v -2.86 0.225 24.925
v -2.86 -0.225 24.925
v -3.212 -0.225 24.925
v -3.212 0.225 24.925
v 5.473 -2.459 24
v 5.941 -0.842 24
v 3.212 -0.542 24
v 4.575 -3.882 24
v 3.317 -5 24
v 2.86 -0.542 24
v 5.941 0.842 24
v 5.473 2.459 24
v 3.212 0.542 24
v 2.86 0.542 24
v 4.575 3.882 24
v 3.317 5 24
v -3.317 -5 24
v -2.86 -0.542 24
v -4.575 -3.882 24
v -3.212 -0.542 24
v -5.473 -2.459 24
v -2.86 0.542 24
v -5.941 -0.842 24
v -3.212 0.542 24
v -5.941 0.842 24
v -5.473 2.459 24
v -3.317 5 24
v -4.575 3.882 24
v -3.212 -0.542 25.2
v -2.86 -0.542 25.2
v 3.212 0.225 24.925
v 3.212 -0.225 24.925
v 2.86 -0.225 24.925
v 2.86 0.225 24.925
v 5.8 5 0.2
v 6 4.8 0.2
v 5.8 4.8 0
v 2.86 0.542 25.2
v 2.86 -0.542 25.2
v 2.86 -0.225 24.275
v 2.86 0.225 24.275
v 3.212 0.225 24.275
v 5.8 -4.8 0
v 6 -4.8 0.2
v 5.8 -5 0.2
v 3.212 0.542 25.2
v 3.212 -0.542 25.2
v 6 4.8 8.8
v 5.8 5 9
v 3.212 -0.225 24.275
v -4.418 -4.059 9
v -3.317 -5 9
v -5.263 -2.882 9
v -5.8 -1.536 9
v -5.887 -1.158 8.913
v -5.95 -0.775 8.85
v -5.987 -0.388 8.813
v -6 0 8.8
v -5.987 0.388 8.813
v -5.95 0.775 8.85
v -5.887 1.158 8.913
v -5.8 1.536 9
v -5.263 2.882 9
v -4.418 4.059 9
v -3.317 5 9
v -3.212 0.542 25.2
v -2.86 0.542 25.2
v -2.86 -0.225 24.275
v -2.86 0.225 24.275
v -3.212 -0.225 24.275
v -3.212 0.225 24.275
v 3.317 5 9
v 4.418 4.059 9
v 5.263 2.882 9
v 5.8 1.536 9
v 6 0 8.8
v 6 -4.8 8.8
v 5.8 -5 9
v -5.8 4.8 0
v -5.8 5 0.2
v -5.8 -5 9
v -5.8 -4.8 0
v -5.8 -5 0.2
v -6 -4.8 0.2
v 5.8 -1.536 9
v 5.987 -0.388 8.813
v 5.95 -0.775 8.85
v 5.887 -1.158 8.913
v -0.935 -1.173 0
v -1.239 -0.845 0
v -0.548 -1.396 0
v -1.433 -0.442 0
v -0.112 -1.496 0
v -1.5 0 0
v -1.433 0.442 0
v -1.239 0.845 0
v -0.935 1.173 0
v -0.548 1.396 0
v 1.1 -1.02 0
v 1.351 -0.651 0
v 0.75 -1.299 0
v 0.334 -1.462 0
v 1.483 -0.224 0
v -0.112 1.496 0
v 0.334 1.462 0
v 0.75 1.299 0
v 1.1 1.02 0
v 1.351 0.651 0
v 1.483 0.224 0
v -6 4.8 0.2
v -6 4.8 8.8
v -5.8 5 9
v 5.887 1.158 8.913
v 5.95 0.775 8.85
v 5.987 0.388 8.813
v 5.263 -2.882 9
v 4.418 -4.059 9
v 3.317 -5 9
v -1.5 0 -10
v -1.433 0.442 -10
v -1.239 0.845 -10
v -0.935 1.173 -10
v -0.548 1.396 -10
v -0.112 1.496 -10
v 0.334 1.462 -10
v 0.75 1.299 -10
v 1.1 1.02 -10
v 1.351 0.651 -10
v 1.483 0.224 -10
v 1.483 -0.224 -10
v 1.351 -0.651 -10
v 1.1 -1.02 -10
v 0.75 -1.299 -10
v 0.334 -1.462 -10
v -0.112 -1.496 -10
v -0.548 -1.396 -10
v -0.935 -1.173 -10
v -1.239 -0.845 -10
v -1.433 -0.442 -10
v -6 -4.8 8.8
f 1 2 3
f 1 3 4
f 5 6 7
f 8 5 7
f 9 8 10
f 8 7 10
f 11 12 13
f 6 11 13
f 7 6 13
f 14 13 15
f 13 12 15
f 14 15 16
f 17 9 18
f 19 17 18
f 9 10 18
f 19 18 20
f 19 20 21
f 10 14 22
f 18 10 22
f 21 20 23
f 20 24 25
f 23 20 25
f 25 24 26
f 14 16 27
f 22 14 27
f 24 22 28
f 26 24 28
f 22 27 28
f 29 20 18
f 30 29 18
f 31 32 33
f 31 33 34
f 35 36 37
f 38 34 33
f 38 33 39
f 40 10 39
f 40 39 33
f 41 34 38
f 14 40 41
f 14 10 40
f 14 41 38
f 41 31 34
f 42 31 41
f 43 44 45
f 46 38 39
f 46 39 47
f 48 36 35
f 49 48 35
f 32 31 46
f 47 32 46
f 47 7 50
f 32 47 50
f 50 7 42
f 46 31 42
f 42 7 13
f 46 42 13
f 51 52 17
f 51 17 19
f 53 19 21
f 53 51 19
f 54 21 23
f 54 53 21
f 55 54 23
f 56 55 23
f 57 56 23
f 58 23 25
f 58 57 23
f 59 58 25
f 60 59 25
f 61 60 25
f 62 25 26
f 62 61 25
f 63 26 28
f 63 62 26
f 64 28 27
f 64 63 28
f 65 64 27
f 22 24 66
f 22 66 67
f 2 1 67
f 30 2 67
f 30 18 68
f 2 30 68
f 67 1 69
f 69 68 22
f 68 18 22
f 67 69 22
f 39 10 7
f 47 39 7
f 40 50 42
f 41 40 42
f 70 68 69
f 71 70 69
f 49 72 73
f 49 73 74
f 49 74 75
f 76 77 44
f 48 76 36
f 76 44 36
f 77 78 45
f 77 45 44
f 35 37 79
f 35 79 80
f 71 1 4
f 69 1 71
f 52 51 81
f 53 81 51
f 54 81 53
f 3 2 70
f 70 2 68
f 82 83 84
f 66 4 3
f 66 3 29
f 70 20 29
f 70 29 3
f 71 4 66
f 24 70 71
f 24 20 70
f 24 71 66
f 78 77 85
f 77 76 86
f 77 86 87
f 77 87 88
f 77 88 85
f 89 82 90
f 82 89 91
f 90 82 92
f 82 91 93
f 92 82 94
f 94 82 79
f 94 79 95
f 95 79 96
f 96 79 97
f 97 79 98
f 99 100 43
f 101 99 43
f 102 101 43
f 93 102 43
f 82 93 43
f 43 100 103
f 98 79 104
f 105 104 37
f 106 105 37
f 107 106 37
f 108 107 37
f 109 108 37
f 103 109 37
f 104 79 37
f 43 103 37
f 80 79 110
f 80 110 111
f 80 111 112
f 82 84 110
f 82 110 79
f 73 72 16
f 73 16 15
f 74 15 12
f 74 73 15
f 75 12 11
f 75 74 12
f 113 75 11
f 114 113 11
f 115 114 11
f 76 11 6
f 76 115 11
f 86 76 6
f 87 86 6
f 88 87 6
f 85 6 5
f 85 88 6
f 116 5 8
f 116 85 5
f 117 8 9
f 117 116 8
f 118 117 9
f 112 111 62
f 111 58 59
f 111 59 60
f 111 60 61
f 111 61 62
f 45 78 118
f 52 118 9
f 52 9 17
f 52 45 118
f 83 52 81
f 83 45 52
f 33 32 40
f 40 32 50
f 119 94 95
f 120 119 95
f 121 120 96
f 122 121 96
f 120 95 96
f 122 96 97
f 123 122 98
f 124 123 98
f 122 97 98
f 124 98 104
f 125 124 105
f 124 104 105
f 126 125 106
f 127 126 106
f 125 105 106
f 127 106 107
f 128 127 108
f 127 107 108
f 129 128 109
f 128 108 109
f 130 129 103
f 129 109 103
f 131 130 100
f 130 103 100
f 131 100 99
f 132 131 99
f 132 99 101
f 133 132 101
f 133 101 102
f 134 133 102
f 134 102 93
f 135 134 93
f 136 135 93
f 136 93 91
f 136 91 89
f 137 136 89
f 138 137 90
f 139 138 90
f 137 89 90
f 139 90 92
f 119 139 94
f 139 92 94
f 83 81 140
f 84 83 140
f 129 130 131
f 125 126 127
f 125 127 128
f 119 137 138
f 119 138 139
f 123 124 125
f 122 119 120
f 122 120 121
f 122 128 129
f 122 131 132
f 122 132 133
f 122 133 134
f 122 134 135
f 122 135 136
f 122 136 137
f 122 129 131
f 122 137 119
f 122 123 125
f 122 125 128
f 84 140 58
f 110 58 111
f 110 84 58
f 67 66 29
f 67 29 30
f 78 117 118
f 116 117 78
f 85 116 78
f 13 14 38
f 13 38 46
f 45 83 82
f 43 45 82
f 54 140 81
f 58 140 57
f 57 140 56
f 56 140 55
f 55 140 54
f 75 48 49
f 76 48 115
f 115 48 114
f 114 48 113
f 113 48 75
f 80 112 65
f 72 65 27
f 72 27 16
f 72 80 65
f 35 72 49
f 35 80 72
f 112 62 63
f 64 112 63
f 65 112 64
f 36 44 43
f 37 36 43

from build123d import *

# Parameters (mm, degrees)
SKETCH_1_W          = 12
SKETCH_1_H          = 10
EXTRUDE_2_DEPTH     = 9
EXTRUDE_4_DEPTH     = 15
CHAMFER_4_SIZE      = 0.2
SKETCH_4_W          = 0.352238381
SKETCH_4_H          = 1.084523436
EXTRUDE_5_DEPTH     = 1.2
SKETCH_5_W          = 0.65
SKETCH_5_H          = 0.45
CUT_EXTRUDE_1_DEPTH = 28.29282553
SKETCH_6_R          = 1.5
EXTRUDE_6_DEPTH     = 10


with BuildPart() as part:
    # 草图1 → 凸台-拉伸2 (new body)
    with BuildSketch(Plane.XY):
        Rectangle(SKETCH_1_W, SKETCH_1_H)
    extrude(amount=EXTRUDE_2_DEPTH)

    # 草图2 → 凸台-拉伸4 (add)
    with BuildSketch(Plane.XY.offset(9)):
        with BuildLine():
            Line((-3.31662479, 5), (3.31662479, 5))
            ThreePointArc((3.31662479, 5), (6, 0), (3.31662479, -5))
            Line((3.31662479, -5), (-3.31662479, -5))
            ThreePointArc((-3.31662479, -5), (-6, 0), (-3.31662479, 5))
        make_face()
    extrude(amount=EXTRUDE_4_DEPTH)

    # 倒角4
    # the kernel refuses this chamfer: 0.2 mm, written as the material it takes off along each edge
    with BuildSketch(Plane(origin=(-5.866666667, -4.866666667, 0.133333333), x_dir=(-0.7071067811865491, 0.707106781186546, 0), z_dir=(-0.577350269189624, -0.5773502691896265, -0.5773502691896268)), Plane(origin=(5.866666667, 4.866666667, 0.133333333), x_dir=(-0.7071067811865478, -3.1401849173675483e-15, -0.7071067811865472), z_dir=(0.577350269189624, 0.5773502691896265, -0.577350269189627))) as chamfer_4_piece_1:
        Polygon((-0.141421356, -0.081649658), (0.141421356, -0.081649658), (0, 0.163299316), align=None)
    extrude(amount=0.254034118, mode=Mode.SUBTRACT)
    with BuildSketch(Plane(origin=(5.866666667, -4.866666667, 0.133333333), x_dir=(0.707106781186546, 0.7071067811865491, 0), z_dir=(0.5773502691896265, -0.577350269189624, -0.577350269189627)), Plane(origin=(-5.866666667, 4.866666667, 0.133333333), x_dir=(0.7071067811865478, 0, -0.7071067811865472), z_dir=(-0.5773502691896265, 0.577350269189624, -0.5773502691896268))) as chamfer_4_piece_2:
        Polygon((-0.141421356, 0.081649658), (0.141421356, 0.081649658), (0, -0.163299316), align=None)
    extrude(amount=0.254034118, mode=Mode.SUBTRACT)
    with BuildSketch(Plane(origin=(-6, 5.514336598, 9), x_dir=(-0.02749587661058742, 0, -0.9996219169112966), z_dir=(0, -1, 0))) as chamfer_4_piece_3_section:
        Polygon((CHAMFER_4_SIZE * 0.999621916911, CHAMFER_4_SIZE * 0.0274958766106), (-CHAMFER_4_SIZE * 0.0274958766106, CHAMFER_4_SIZE * 0.999621916911), (0, 0), align=None)
    chamfer_4_piece_3 = extrude(amount=5.514336598, mode=Mode.PRIVATE)
    chamfer_4_piece_3 = chamfer_4_piece_3 - Plane(origin=(0, 0, 8.93146509), x_dir=(-0.5527707983925667, -0.8333333333333334, 0), z_dir=(0, 0, -1)) * Cylinder(6, 12, mode=Mode.PRIVATE)
    add(chamfer_4_piece_3, mode=Mode.SUBTRACT)
    with BuildSketch(Plane(origin=(6, 0, 9), x_dir=(0.02749587661058742, 0, -0.9996219169112966), z_dir=(0, 1, 0))) as chamfer_4_piece_4_section:
        Polygon((CHAMFER_4_SIZE * 0.999621916911, CHAMFER_4_SIZE * 0.0274958766106), (-CHAMFER_4_SIZE * 0.0274958766106, CHAMFER_4_SIZE * 0.999621916911), (0, 0), align=None)
    chamfer_4_piece_4 = extrude(amount=5.514336598, mode=Mode.PRIVATE)
    chamfer_4_piece_4 = chamfer_4_piece_4 - Plane(origin=(0, 0, 8.931465093), x_dir=(0.5527707983925666, 0.8333333333333334, 0), z_dir=(0, 0, -1)) * Cylinder(6, 12, mode=Mode.PRIVATE)
    add(chamfer_4_piece_4, mode=Mode.SUBTRACT)
    with BuildSketch(Plane(origin=(-6, 0, 9), x_dir=(-0.02749587661058742, 0, -0.9996219169112966), z_dir=(0, -1, 0))) as chamfer_4_piece_5_section:
        Polygon((CHAMFER_4_SIZE * 0.999621916911, CHAMFER_4_SIZE * 0.0274958766106), (-CHAMFER_4_SIZE * 0.0274958766106, CHAMFER_4_SIZE * 0.999621916911), (0, 0), align=None)
    chamfer_4_piece_5 = extrude(amount=5.514336598, mode=Mode.PRIVATE)
    chamfer_4_piece_5 = chamfer_4_piece_5 - Plane(origin=(0, 0, 8.931465093), x_dir=(-0.5527707983925667, -0.8333333333333334, 0), z_dir=(0, 0, -1)) * Cylinder(6, 12, mode=Mode.PRIVATE)
    add(chamfer_4_piece_5, mode=Mode.SUBTRACT)
    with BuildSketch(Plane(origin=(6, -5.514336598, 9), x_dir=(0.02749587661058742, 0, -0.9996219169112966), z_dir=(0, 1, 0))) as chamfer_4_piece_6_section:
        Polygon((CHAMFER_4_SIZE * 0.999621916911, CHAMFER_4_SIZE * 0.0274958766106), (-CHAMFER_4_SIZE * 0.0274958766106, CHAMFER_4_SIZE * 0.999621916911), (0, 0), align=None)
    chamfer_4_piece_6 = extrude(amount=5.514336598, mode=Mode.PRIVATE)
    chamfer_4_piece_6 = chamfer_4_piece_6 - Plane(origin=(0, 0, 8.93146509), x_dir=(0.5527707983925666, 0.8333333333333334, 0), z_dir=(0, 0, -1)) * Cylinder(6, 12, mode=Mode.PRIVATE)
    add(chamfer_4_piece_6, mode=Mode.SUBTRACT)
    with BuildSketch(Plane(origin=(-6.514336598, -5, 0), x_dir=(0, -0.02749587661058735, 0.9996219169112966), z_dir=(1, 0, 0))) as chamfer_4_piece_7:
        Polygon((CHAMFER_4_SIZE * 0.999621916911, -CHAMFER_4_SIZE * 0.0274958766106), (-CHAMFER_4_SIZE * 0.0274958766106, -CHAMFER_4_SIZE * 0.999621916911), (0, 0), align=None)
    extrude(amount=13.028673195, mode=Mode.SUBTRACT)
    with BuildSketch(Plane(origin=(-6, 5.514336598, 0), x_dir=(-0.02749587661058735, 0, 0.9996219169112966), z_dir=(0, -1, 0)), Plane(origin=(6, -5.514336598, 0), x_dir=(0.02749587661058735, 0, 0.9996219169112966), z_dir=(0, 1, 0))) as chamfer_4_piece_8:
        Polygon((CHAMFER_4_SIZE * 0.999621916911, -CHAMFER_4_SIZE * 0.0274958766106), (-CHAMFER_4_SIZE * 0.0274958766106, -CHAMFER_4_SIZE * 0.999621916911), (0, 0), align=None)
    extrude(amount=11.028673195, mode=Mode.SUBTRACT)
    with BuildSketch(Plane(origin=(6.514336598, 5, 0), x_dir=(0, -0.9996219169112968, -0.027495876610586313), z_dir=(-1, 0, 0))) as chamfer_4_piece_9:
        Polygon((CHAMFER_4_SIZE * 0.999621916911, CHAMFER_4_SIZE * 0.0274958766106), (-CHAMFER_4_SIZE * 0.0274958766106, CHAMFER_4_SIZE * 0.999621916911), (0, 0), align=None)
    extrude(amount=13.028673195, mode=Mode.SUBTRACT)
    with BuildSketch(Plane(origin=(6, -5, -0.514336598), x_dir=(-0.9996219169112966, -0.02749587661058742, 0), z_dir=(0, 0, 1)), Plane(origin=(6, 5, -0.514336598), x_dir=(0.02749587661058742, -0.9996219169112966, 0), z_dir=(0, 0, 1))) as chamfer_4_piece_10:
        Polygon((CHAMFER_4_SIZE * 0.999621916911, -CHAMFER_4_SIZE * 0.0274958766106), (-CHAMFER_4_SIZE * 0.0274958766106, -CHAMFER_4_SIZE * 0.999621916911), (0, 0), align=None)
    extrude(amount=10.028673195, mode=Mode.SUBTRACT)
    with BuildSketch(Plane(origin=(-6, -5, -0.514336598), x_dir=(0.9996219169112966, -0.027495876610587302, 0), z_dir=(0, 0, 1)), Plane(origin=(-6, 5, -0.514336598), x_dir=(-0.027495876610587302, -0.9996219169112966, 0), z_dir=(0, 0, 1))) as chamfer_4_piece_11:
        Polygon((CHAMFER_4_SIZE * 0.999621916911, CHAMFER_4_SIZE * 0.0274958766106), (-CHAMFER_4_SIZE * 0.0274958766106, CHAMFER_4_SIZE * 0.999621916911), (0, 0), align=None)
    extrude(amount=10.028673195, mode=Mode.SUBTRACT)

    # 草图4 → 凸台-拉伸5 (add)
    with BuildSketch(Plane.XY.offset(24)):
        with Locations((-3.035738681, 0)):
            Rectangle(SKETCH_4_W, SKETCH_4_H)
        with Locations((3.035738681, 0)):
            Rectangle(SKETCH_4_W, SKETCH_4_H)
    extrude(amount=EXTRUDE_5_DEPTH)

    # 草图5 → 切除-拉伸1 (cut, through all)
    with BuildSketch(Plane(origin=(3.211857871, 0, 0), x_dir=(0, 0, -1), z_dir=(1, 0, 0))):
        with Locations((-24.6, 0)):
            Rectangle(SKETCH_5_W, SKETCH_5_H)
    extrude(amount=-CUT_EXTRUDE_1_DEPTH, mode=Mode.SUBTRACT)

    # 草图6 → 凸台-拉伸6 (add)
    with BuildSketch(Plane(origin=(0, 0, 0), x_dir=(-1, 0, 0), z_dir=(0, 0, -1))):
        Circle(SKETCH_6_R)
    extrude(amount=EXTRUDE_6_DEPTH)


solid = part.part
